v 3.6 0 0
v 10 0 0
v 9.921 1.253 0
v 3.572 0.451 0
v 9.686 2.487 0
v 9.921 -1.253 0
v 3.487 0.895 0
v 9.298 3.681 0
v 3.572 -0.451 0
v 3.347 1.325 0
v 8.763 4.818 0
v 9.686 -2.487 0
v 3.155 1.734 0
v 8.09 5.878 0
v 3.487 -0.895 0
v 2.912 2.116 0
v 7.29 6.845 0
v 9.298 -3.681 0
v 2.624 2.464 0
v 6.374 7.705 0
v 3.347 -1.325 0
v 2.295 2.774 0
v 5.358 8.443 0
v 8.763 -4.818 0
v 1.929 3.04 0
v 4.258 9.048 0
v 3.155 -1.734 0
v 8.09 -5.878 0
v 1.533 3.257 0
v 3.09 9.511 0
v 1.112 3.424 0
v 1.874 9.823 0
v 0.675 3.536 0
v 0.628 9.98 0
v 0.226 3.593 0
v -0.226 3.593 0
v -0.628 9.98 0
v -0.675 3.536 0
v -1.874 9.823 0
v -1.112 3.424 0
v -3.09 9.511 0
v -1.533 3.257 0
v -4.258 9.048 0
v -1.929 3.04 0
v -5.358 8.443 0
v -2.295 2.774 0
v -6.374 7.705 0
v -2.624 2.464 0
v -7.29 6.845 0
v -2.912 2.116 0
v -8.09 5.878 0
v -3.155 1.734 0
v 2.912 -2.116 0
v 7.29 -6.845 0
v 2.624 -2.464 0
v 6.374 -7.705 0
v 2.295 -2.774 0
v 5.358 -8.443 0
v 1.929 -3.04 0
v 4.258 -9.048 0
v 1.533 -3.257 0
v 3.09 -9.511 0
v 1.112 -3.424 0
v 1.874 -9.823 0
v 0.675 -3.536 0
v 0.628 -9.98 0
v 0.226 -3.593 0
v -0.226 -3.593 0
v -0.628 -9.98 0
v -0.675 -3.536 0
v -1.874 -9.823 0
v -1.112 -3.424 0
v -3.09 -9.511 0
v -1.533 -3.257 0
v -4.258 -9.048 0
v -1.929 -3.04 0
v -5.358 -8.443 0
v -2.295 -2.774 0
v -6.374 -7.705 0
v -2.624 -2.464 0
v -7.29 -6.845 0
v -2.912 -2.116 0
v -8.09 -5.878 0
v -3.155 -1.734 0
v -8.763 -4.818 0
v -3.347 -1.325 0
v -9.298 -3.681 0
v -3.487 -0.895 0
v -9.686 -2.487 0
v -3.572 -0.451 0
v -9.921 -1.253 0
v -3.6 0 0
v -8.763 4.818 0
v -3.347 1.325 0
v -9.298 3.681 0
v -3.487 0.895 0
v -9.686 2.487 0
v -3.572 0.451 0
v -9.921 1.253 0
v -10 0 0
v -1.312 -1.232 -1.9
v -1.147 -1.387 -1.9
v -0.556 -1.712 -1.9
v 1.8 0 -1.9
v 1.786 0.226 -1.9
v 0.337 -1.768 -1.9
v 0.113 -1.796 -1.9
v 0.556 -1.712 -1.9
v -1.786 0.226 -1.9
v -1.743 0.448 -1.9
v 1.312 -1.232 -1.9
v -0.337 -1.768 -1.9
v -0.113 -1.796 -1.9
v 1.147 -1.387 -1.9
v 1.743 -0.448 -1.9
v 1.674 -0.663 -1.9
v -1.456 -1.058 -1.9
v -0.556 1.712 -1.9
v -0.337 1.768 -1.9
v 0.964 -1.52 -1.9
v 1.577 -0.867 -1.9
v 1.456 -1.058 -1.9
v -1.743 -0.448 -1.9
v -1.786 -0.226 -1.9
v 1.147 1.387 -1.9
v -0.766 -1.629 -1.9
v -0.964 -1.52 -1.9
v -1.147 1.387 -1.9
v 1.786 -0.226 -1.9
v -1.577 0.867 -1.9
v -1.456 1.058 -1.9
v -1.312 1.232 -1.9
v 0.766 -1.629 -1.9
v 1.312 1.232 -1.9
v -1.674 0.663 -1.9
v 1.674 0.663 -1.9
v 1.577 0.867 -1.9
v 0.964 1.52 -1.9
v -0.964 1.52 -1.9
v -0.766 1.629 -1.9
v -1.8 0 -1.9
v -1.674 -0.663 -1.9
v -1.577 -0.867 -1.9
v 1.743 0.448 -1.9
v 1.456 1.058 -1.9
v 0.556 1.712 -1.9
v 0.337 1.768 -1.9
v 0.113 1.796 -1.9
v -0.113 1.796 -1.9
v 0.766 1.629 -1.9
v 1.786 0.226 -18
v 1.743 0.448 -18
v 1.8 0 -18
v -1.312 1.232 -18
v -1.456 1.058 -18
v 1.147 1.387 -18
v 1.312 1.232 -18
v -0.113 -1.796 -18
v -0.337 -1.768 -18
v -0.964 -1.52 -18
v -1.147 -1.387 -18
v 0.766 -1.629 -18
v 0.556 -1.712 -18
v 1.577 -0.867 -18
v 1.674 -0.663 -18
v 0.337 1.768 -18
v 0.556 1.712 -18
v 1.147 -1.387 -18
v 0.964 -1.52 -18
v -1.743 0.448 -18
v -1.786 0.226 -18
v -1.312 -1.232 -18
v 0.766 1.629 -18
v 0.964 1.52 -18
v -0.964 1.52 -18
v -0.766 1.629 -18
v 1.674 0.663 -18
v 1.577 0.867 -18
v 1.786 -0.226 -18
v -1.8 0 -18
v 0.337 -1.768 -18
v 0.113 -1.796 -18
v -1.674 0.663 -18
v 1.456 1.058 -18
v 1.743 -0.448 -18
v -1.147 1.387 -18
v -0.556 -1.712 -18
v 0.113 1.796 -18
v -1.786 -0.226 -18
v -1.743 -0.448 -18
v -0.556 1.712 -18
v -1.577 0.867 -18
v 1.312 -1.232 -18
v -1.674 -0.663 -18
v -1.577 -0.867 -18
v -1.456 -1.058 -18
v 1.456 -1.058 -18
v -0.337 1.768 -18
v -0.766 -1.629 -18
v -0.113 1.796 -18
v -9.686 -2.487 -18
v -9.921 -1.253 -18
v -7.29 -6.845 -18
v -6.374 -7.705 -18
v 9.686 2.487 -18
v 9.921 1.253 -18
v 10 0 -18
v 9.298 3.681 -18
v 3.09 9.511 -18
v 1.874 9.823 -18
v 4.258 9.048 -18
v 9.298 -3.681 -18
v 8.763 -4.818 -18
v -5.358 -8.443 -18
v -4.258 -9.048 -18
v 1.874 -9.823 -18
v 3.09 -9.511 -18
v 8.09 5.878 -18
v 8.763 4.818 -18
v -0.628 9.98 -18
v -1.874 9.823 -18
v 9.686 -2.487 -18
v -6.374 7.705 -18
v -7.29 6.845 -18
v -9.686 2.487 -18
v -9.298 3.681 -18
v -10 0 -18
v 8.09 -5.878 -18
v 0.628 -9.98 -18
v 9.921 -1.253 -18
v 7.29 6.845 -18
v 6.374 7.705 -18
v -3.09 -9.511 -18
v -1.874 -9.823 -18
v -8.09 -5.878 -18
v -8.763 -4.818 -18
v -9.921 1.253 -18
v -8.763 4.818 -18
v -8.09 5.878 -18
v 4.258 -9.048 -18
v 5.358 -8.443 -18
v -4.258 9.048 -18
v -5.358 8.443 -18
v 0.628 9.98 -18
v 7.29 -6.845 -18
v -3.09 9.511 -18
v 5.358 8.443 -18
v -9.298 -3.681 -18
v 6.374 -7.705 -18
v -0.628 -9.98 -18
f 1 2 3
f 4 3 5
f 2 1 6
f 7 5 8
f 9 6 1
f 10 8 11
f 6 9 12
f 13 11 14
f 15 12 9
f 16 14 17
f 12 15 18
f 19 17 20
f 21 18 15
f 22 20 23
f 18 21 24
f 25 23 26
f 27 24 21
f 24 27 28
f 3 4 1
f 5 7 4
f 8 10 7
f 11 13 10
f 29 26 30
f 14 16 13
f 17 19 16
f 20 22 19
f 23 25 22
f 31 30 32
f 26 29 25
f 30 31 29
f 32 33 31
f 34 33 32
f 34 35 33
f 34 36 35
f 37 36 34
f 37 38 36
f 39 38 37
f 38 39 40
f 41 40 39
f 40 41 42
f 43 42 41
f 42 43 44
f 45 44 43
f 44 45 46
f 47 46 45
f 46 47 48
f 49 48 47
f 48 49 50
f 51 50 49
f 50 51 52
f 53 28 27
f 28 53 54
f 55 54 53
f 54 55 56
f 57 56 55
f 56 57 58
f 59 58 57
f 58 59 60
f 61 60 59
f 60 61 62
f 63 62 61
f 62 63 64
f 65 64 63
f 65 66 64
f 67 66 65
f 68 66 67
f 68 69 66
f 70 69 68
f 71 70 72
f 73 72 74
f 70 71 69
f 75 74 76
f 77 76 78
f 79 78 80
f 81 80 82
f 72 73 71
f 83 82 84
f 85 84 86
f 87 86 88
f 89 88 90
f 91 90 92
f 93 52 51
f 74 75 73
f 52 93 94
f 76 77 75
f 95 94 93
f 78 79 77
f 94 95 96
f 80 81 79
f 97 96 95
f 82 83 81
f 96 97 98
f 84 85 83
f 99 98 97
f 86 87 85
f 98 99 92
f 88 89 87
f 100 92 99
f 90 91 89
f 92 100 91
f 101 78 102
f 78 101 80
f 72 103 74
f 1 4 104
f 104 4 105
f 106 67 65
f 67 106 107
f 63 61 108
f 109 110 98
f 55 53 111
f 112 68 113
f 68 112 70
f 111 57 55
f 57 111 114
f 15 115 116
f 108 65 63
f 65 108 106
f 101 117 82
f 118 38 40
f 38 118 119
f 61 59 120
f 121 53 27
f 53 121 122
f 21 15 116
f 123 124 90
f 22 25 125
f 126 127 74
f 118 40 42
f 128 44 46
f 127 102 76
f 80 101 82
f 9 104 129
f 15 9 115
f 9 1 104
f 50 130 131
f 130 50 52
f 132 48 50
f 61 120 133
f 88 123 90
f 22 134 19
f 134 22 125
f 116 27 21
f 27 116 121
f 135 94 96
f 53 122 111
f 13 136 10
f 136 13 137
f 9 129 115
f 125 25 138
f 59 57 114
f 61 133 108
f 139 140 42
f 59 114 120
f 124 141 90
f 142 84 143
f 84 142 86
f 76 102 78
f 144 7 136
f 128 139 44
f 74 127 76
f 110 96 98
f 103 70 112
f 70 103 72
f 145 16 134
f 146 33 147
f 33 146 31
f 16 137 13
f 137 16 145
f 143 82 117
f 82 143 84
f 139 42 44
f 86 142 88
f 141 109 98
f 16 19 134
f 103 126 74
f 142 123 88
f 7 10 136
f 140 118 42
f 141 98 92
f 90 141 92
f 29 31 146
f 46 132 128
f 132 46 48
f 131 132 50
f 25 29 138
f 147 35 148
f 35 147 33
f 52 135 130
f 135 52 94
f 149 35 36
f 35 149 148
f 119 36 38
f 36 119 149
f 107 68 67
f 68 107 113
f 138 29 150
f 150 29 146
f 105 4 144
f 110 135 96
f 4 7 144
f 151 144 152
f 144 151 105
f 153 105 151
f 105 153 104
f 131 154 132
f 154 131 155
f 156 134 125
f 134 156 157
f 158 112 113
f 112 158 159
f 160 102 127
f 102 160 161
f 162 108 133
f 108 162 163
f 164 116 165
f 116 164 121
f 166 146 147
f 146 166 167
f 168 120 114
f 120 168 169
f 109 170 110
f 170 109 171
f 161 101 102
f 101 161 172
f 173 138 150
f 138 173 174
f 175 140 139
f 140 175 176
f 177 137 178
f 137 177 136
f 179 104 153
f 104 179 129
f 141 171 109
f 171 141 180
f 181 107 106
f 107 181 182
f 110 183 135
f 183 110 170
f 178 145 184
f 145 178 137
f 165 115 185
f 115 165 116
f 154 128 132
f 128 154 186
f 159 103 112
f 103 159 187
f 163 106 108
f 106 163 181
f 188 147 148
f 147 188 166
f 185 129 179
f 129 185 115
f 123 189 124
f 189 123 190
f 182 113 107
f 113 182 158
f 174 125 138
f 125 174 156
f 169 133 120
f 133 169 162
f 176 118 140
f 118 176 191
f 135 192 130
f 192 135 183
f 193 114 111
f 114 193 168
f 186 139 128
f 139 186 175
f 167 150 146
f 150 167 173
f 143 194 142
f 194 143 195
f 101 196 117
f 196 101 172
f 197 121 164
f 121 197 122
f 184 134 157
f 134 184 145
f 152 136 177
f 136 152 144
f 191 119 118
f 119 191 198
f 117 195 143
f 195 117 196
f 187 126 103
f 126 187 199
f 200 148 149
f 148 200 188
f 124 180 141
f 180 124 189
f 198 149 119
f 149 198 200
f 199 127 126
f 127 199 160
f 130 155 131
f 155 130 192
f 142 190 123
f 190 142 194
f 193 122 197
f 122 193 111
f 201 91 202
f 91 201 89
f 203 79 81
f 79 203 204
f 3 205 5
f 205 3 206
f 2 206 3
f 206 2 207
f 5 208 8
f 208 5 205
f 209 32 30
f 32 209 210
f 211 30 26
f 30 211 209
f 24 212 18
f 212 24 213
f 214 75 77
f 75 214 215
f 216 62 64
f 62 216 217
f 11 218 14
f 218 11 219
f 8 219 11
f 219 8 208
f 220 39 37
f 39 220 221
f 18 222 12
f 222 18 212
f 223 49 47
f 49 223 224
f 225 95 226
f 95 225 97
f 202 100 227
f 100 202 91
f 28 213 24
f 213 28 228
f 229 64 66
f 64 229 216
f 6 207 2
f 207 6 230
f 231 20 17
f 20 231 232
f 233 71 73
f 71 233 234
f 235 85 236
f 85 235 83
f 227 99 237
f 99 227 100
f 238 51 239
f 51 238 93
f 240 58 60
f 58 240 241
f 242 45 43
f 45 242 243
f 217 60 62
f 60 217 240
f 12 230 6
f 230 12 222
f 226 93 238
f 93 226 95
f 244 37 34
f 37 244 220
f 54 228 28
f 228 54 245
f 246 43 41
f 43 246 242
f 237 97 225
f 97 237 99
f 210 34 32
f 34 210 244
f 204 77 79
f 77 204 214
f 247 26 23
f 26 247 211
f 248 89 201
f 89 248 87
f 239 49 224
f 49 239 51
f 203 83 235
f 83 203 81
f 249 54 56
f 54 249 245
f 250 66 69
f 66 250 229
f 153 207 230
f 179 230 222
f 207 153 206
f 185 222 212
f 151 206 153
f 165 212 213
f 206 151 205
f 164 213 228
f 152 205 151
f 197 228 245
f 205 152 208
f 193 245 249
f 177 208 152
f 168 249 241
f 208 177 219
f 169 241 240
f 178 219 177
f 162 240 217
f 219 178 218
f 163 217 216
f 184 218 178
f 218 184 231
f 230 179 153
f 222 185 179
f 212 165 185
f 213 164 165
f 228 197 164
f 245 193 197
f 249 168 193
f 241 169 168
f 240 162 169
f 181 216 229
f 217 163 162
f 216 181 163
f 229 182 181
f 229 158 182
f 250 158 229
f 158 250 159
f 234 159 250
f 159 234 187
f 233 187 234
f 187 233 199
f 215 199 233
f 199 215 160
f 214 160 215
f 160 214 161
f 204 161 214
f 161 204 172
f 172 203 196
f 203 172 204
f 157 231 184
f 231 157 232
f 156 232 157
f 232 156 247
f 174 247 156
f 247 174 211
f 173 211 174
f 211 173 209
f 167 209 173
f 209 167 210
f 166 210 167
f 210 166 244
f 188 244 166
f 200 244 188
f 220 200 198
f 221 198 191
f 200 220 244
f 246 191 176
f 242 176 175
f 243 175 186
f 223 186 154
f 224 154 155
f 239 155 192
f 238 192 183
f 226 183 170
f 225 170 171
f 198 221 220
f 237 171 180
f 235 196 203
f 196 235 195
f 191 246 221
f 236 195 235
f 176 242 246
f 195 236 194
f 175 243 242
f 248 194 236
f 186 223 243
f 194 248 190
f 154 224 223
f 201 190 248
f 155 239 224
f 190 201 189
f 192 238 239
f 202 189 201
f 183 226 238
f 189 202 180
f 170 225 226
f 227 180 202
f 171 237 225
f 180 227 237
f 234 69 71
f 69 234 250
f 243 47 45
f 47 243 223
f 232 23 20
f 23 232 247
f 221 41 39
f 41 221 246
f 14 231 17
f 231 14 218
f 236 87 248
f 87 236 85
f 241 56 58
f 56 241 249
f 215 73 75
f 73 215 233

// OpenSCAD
$fn = 50;


difference() {
	union() {
		translate(v = [0, 0, -18.0000000000]) {
			cylinder(h = 18, r = 10.0000000000);
		}
	}
	union() {
		translate(v = [0, 0, 0]) {
			rotate(a = [0, 0, 0]) {
				difference() {
					union() {
						translate(v = [0, 0, -21.0000000000]) {
							cylinder(h = 21, r = 1.5000000000);
						}
						translate(v = [0, 0, -1.9000000000]) {
							cylinder(h = 1.9000000000, r1 = 1.8000000000, r2 = 3.6000000000);
						}
						translate(v = [0, 0, -21.0000000000]) {
							cylinder(h = 21, r = 1.8000000000);
						}
						translate(v = [0, 0, -21.0000000000]) {
							cylinder(h = 21, r = 1.5000000000);
						}
					}
					union();
				}
			}
		}
	}
}
